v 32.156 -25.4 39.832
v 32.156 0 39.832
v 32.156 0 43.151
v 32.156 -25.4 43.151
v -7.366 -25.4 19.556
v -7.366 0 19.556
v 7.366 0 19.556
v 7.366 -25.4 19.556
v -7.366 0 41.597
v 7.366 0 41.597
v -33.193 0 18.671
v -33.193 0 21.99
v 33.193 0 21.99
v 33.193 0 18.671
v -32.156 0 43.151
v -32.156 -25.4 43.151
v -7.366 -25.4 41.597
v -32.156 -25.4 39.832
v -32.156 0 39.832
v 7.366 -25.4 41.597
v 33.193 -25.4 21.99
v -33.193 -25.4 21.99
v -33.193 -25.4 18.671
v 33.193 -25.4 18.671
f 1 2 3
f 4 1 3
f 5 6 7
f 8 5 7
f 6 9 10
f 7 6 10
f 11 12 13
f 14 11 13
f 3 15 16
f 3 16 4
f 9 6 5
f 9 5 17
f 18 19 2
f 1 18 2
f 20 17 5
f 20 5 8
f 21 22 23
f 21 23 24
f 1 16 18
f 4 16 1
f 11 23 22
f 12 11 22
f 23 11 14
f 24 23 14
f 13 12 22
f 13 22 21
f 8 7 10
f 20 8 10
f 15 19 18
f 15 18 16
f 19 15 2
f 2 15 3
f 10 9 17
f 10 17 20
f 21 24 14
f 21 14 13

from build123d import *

# Parameters (mm, degrees)
F0_W     = 66.386222
F0_H     = 3.319323
F0_W_2   = 64.311772
F0_H_2   = 3.319309
F1_DEPTH = 25.4
F2_W     = 14.731928
F2_H     = 22.041164
F3_DEPTH = 25.4


with BuildPart() as f1:
    # F0 (on Front) → F1 (new body)
    with BuildSketch(Plane.XZ):
        with Locations((0, 20.33081)):
            Rectangle(F0_W, F0_H)
        with Locations((0, 41.491441)):
            Rectangle(F0_W_2, F0_H_2)
    extrude(amount=F1_DEPTH)


with BuildPart() as f3:
    # F2 (on Front) → F3 (new body)
    with BuildSketch(Plane.XZ):
        with Locations((0, 30.576844)):
            Rectangle(F2_W, F2_H)
    extrude(amount=F3_DEPTH)


solid = Compound([f1.part, f3.part])
